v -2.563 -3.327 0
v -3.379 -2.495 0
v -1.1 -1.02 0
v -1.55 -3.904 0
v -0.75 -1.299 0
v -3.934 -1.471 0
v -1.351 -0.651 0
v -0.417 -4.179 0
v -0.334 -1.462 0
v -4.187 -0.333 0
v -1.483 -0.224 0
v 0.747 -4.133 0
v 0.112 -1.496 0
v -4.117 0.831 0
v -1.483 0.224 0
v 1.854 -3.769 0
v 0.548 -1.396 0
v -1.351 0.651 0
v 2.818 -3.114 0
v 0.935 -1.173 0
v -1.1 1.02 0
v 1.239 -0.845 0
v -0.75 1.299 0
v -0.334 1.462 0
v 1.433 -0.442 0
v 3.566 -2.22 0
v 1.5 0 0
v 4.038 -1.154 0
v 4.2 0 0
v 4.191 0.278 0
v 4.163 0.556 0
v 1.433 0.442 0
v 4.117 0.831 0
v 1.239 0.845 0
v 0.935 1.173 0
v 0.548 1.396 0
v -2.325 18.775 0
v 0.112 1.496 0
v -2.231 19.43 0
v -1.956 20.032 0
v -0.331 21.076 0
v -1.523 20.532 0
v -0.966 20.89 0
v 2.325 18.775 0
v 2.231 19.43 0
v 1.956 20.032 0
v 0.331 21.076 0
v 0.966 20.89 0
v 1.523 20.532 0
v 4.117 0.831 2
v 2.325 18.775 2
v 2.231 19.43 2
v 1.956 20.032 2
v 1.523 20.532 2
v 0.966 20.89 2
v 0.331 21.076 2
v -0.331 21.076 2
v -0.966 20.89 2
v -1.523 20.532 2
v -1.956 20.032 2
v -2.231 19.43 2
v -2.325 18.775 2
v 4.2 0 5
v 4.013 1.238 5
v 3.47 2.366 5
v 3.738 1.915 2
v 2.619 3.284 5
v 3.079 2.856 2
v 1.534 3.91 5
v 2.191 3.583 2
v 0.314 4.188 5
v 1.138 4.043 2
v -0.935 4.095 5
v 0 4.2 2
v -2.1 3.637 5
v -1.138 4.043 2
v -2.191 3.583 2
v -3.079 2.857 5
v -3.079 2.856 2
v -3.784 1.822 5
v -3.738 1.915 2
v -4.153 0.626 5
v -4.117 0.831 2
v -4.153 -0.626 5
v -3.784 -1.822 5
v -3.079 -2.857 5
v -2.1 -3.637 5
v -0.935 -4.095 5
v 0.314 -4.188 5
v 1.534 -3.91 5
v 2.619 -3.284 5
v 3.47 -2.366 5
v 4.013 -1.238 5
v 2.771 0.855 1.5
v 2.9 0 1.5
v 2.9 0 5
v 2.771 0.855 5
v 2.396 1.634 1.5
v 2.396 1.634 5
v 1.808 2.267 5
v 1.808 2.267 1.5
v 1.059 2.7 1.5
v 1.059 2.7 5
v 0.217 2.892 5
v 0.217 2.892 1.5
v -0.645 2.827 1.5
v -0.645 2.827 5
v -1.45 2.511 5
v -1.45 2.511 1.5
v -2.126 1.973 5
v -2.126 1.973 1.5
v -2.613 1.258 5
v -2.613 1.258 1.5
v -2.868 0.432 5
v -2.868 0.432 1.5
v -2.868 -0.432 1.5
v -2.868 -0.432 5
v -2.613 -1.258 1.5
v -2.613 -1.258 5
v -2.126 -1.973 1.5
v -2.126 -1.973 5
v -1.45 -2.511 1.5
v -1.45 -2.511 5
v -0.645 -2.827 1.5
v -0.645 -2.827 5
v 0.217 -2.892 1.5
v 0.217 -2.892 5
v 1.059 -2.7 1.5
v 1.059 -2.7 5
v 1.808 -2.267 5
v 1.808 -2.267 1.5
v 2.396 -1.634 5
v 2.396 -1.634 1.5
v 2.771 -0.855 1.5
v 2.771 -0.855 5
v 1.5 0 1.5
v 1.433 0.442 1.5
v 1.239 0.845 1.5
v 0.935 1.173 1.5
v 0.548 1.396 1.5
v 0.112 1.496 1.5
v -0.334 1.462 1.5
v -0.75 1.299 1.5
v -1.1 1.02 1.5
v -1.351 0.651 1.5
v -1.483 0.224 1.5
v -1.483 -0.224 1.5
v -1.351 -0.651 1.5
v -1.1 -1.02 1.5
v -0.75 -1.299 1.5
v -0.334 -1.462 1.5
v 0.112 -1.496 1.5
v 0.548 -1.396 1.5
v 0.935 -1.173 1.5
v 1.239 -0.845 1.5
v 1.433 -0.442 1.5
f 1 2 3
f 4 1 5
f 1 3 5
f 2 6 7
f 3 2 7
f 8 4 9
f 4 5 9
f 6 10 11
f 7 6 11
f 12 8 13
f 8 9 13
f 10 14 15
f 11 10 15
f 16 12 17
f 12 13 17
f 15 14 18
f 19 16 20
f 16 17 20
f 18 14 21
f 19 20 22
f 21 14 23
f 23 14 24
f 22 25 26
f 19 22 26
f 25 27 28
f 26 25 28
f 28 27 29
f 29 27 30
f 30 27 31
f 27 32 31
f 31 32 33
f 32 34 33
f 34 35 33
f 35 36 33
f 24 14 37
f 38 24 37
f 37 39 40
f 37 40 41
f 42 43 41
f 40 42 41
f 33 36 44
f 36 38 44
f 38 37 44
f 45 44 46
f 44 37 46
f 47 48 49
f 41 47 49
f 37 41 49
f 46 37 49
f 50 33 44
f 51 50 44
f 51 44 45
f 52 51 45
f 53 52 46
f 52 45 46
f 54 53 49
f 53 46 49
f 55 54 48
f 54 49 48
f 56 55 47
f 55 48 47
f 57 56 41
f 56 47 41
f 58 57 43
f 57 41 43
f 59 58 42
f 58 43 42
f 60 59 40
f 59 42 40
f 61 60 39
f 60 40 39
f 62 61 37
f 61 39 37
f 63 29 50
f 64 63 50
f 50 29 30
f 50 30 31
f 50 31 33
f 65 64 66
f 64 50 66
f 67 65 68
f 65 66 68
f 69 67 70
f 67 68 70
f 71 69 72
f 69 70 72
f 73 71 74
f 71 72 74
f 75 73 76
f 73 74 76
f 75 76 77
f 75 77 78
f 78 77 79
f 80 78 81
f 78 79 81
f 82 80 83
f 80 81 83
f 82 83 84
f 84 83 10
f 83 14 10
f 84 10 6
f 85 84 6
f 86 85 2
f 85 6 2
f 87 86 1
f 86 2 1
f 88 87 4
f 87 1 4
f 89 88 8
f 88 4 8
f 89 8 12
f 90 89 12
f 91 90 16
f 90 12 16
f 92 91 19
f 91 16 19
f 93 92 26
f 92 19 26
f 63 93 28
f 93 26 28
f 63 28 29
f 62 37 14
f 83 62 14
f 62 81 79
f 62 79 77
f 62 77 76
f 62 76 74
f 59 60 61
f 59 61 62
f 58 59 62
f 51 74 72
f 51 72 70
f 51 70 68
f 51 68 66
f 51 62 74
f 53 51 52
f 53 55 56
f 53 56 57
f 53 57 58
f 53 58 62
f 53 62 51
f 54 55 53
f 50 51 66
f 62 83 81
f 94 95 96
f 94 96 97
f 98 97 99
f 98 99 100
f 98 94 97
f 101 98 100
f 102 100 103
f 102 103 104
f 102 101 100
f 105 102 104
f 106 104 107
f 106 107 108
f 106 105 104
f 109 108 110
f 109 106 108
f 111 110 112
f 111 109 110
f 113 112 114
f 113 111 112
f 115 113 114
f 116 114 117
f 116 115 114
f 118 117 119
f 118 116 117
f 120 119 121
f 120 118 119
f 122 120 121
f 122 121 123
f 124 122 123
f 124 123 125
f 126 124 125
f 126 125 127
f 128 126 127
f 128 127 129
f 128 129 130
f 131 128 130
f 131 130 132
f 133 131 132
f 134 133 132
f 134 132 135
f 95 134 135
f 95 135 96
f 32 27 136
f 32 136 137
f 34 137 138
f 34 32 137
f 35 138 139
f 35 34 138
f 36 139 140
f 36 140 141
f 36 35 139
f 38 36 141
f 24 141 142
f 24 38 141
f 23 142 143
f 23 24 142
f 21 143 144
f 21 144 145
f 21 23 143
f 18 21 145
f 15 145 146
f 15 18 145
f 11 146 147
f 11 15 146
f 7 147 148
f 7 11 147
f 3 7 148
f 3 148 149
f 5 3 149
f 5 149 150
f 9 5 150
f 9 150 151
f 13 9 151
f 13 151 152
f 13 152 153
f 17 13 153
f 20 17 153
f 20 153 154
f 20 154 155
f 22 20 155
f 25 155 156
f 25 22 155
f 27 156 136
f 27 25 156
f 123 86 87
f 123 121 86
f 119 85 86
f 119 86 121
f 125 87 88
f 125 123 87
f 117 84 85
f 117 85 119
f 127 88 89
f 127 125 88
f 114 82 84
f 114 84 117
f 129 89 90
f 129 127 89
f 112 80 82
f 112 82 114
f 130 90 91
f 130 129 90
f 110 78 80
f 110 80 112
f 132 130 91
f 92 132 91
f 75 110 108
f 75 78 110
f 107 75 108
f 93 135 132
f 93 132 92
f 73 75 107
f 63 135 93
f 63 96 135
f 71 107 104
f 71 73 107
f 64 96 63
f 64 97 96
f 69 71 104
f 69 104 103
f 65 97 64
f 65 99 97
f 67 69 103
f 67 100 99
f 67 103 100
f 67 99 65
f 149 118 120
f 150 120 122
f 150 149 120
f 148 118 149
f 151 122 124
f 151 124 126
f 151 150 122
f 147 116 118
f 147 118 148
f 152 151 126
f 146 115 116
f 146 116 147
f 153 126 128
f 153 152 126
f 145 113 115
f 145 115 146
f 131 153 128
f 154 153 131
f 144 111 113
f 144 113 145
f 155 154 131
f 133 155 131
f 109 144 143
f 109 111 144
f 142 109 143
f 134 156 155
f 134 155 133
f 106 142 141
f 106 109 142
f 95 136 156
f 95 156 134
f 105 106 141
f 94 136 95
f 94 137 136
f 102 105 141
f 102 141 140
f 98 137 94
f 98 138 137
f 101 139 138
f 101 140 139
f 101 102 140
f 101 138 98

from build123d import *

# Parameters (mm, degrees)
BOSS_EXTRUDE1_DEPTH = 2
SKETCH1_3_R         = 2.9
BOSS_EXTRUDE2_DEPTH = 5
SKETCH1_4_R         = 2.9
SKETCH1_4_R_2       = 1.5
BOSS_EXTRUDE3_DEPTH = 1.5


with BuildPart() as part:
    # Sketch1 → Boss-Extrude1 (new body)
    with BuildSketch(Plane.XY):
        with BuildLine():
            ThreePointArc((-4.117050837, 0.83059762), (0, 4.2), (4.117050837, 0.83059762))
            Line((4.117050837, 0.83059762), (2.325, 18.775))
            ThreePointArc((2.325, 18.775), (0, 21.1), (-2.325, 18.775))
            Line((-2.325, 18.775), (-4.117050837, 0.83059762))
        make_face()
    extrude(amount=BOSS_EXTRUDE1_DEPTH)

    # Sketch1<3> → Boss-Extrude2 (add)
    with BuildSketch(Plane.XY):
        with BuildLine():
            ThreePointArc((4.2, 0), (4.17921126, 0.41736464), (4.117050837, 0.83059762))
            ThreePointArc((4.117050837, 0.83059762), (0, 4.2), (-4.117050837, 0.83059762))
            ThreePointArc((-4.117050837, 0.83059762), (-0.41736464, -4.17921126), (4.2, 0))
        make_face()
        Circle(SKETCH1_3_R, mode=Mode.SUBTRACT)
    extrude(amount=BOSS_EXTRUDE2_DEPTH)

    # Sketch1<4> → Boss-Extrude3 (add)
    with BuildSketch(Plane.XY):
        Circle(SKETCH1_4_R)
        Circle(SKETCH1_4_R_2, mode=Mode.SUBTRACT)
    extrude(amount=BOSS_EXTRUDE3_DEPTH)


solid = part.part
